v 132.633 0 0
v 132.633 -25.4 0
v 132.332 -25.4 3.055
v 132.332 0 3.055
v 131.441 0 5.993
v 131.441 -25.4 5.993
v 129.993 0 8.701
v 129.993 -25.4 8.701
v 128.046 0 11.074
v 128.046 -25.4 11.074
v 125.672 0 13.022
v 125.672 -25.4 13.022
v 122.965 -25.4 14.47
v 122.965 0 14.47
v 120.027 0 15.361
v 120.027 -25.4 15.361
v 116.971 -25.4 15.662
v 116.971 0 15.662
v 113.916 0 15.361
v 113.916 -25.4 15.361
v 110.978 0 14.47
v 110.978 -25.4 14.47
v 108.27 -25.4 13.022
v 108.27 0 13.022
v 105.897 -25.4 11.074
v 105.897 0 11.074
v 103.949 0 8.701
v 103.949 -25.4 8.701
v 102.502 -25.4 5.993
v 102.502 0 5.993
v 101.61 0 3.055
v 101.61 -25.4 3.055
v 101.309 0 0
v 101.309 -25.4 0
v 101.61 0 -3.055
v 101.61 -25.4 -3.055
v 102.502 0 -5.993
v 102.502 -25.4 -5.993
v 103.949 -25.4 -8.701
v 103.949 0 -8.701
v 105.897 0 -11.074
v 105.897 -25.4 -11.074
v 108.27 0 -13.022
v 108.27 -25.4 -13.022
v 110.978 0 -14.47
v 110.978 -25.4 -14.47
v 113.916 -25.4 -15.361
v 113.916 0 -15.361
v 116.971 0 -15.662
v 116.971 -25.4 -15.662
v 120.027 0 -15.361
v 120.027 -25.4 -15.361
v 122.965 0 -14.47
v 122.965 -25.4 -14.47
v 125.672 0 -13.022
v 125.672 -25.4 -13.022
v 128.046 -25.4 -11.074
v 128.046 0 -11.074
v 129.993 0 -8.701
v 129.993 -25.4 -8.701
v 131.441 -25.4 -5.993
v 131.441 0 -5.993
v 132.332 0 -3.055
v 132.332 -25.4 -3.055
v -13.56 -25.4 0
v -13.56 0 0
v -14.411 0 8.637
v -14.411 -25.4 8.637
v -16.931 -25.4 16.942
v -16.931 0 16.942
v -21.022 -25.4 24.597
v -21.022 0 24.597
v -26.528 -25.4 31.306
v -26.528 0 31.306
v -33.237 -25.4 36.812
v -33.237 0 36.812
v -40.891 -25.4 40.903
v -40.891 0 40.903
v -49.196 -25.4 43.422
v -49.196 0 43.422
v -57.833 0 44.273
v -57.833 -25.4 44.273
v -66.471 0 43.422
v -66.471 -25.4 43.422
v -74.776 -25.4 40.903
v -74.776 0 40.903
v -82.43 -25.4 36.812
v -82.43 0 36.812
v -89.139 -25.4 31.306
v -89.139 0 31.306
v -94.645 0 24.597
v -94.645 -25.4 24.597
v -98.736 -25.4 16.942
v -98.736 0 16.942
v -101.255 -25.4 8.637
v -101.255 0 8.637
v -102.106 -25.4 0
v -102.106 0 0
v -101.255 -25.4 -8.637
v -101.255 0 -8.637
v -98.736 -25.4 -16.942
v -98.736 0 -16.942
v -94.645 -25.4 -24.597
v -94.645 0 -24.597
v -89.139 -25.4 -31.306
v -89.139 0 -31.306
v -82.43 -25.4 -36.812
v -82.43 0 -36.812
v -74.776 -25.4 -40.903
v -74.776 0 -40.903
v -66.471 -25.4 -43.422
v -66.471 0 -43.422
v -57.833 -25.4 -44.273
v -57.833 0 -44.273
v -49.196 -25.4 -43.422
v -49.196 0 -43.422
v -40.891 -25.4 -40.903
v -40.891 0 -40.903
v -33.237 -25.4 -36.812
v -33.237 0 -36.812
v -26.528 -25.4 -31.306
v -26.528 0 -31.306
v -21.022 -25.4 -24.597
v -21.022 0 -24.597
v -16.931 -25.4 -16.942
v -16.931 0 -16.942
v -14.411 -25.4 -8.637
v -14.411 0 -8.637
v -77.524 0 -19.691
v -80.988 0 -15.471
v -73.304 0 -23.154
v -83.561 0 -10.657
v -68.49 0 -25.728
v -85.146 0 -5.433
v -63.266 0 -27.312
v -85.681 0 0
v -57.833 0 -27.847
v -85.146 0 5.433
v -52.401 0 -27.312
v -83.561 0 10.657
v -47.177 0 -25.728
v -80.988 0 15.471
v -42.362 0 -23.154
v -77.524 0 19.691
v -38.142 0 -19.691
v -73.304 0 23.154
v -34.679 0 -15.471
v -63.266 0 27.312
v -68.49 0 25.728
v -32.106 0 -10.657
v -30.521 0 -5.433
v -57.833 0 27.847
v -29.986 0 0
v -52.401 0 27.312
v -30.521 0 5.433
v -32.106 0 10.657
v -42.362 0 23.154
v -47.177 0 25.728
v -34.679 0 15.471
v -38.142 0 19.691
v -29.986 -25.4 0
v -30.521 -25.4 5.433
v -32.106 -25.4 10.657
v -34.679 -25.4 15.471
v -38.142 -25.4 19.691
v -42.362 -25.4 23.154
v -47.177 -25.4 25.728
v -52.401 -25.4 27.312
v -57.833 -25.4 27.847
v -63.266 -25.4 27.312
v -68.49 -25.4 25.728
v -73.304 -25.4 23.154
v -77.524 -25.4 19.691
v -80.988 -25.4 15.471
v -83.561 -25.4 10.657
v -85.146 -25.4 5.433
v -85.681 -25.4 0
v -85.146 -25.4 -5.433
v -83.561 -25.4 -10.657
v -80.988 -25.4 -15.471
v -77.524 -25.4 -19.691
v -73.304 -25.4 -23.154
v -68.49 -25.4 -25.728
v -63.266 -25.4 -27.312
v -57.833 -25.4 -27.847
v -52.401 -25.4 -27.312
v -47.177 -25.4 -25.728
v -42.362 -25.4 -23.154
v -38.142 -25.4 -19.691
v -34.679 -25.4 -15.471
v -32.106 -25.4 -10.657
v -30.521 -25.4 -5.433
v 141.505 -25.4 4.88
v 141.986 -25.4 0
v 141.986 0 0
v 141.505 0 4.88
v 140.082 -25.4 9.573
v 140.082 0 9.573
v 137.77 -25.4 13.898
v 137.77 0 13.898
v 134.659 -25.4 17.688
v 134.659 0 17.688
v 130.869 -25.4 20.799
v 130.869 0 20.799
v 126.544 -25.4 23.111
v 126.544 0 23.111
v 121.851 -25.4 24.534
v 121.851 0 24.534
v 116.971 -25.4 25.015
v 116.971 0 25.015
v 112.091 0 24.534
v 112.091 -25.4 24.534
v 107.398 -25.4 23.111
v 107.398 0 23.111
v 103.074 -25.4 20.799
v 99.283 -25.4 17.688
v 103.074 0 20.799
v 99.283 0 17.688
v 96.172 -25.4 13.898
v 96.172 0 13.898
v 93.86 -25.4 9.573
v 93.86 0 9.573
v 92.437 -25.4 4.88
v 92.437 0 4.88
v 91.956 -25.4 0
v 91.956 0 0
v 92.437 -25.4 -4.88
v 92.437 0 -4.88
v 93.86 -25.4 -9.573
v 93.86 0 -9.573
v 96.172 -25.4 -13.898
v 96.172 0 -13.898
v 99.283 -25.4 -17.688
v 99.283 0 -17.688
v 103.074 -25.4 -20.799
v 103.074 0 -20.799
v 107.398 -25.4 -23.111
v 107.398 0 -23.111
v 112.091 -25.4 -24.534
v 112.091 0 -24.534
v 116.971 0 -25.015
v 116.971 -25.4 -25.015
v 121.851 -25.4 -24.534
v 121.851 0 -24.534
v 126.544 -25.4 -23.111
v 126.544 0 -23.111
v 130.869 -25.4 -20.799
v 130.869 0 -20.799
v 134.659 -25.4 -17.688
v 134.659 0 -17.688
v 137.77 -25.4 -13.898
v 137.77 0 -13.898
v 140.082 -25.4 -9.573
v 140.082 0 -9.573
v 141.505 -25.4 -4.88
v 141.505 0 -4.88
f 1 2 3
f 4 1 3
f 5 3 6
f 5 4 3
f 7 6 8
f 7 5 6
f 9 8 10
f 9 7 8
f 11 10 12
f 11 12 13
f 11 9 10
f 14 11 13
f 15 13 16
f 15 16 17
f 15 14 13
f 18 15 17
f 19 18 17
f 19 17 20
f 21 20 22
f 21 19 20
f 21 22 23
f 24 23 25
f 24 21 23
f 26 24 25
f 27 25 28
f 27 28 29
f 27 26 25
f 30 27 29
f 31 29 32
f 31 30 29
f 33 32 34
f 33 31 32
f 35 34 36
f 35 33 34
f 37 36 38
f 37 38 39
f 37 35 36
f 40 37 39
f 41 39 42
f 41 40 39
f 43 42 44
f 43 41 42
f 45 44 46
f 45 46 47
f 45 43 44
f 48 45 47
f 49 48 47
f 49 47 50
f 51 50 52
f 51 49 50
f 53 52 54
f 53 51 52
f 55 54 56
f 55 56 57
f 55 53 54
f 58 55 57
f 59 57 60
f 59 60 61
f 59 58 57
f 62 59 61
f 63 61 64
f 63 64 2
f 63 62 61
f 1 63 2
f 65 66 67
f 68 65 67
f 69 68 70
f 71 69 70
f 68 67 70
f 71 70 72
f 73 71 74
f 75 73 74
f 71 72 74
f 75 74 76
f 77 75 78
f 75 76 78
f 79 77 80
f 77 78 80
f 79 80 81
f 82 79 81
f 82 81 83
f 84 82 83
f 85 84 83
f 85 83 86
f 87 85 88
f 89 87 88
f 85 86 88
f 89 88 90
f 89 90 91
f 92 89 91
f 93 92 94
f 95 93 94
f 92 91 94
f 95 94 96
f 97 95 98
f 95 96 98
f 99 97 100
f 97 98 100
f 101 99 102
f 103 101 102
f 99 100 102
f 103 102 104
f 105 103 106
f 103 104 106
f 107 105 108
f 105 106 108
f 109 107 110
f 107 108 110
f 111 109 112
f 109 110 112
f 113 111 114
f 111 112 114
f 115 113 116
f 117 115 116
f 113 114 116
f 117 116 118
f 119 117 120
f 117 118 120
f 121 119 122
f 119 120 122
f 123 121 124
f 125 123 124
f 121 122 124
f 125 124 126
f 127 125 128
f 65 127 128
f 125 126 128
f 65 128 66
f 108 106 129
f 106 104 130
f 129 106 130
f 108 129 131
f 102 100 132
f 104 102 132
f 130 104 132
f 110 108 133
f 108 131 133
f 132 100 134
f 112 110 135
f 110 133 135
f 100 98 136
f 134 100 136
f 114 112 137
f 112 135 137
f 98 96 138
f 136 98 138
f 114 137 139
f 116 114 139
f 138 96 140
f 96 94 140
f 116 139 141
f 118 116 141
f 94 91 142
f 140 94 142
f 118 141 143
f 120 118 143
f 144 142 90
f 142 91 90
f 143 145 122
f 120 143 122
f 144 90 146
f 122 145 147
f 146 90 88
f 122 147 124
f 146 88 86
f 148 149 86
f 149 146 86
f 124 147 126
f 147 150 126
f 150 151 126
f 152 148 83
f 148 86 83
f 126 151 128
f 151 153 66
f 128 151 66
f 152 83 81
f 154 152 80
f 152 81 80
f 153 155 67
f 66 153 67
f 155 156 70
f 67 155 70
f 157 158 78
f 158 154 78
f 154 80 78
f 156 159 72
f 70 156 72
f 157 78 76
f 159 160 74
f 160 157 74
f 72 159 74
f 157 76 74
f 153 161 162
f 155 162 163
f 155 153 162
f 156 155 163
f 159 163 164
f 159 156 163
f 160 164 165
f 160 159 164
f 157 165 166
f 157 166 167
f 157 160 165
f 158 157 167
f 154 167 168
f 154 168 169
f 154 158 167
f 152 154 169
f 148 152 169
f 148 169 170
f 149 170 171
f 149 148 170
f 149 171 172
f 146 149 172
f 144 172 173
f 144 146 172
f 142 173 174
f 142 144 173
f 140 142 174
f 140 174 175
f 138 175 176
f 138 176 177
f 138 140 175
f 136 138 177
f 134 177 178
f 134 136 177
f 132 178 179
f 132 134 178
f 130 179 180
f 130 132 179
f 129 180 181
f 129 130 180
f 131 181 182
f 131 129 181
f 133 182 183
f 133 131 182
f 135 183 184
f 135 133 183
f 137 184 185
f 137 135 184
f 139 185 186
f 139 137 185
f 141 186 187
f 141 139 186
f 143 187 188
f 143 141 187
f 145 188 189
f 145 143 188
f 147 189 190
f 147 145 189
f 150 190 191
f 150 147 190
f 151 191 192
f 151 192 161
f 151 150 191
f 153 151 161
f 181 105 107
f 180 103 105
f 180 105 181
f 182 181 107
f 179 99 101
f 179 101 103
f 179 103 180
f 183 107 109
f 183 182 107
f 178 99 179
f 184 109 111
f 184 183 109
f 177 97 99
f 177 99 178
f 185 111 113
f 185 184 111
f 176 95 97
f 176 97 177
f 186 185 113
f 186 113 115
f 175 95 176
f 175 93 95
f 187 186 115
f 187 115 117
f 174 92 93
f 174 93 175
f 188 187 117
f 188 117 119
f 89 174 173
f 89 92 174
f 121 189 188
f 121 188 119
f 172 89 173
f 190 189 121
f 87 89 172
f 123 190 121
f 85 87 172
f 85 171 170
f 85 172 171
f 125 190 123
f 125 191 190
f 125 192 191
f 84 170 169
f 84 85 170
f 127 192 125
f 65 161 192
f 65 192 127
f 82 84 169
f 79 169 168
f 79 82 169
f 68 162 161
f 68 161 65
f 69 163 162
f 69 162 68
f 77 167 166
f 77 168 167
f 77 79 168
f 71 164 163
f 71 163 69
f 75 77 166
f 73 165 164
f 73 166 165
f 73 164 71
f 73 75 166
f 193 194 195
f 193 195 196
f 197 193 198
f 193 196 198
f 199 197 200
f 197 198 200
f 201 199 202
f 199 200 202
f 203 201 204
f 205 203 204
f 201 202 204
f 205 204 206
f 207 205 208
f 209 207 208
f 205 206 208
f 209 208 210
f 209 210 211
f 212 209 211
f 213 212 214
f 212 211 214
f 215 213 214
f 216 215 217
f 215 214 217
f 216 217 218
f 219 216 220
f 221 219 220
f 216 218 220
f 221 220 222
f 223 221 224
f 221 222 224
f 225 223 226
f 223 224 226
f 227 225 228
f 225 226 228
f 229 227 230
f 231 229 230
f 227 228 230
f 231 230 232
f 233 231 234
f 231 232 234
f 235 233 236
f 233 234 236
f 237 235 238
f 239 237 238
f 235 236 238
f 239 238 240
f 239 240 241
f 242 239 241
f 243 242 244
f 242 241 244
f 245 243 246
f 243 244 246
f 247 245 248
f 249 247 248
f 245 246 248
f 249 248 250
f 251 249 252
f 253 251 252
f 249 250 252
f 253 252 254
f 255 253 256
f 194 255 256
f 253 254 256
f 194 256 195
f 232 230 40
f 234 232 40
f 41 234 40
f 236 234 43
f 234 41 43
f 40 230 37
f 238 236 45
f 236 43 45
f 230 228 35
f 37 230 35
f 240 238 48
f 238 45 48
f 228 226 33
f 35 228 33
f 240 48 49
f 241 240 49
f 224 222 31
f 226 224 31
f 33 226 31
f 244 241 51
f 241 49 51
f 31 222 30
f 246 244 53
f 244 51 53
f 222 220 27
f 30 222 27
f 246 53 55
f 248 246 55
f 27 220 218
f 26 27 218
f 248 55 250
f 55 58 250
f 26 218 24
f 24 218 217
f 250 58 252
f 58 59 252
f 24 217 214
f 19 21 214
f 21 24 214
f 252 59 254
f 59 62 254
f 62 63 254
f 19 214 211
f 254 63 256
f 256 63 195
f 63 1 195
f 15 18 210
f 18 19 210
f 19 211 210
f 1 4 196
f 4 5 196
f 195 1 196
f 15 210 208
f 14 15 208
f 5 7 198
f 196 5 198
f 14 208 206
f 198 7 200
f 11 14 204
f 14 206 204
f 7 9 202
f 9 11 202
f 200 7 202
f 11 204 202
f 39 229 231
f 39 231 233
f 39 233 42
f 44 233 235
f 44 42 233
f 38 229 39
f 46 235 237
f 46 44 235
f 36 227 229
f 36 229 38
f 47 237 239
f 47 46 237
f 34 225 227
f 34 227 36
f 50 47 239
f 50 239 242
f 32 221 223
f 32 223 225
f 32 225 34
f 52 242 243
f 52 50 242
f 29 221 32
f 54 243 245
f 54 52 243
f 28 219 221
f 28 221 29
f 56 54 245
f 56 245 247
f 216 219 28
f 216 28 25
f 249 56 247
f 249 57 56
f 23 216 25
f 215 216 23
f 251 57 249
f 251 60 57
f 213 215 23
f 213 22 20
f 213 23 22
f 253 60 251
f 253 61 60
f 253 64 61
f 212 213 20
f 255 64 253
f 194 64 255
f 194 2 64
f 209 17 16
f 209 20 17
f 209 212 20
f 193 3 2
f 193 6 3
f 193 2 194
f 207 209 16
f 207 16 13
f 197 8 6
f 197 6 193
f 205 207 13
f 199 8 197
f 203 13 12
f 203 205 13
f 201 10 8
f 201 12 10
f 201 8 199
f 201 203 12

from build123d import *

# Parameters (mm, degrees)
F0_R     = 44.2728282083
F0_R_2   = 27.8473949091
F1_DEPTH = 25.4
F2_R     = 25.0148515276
F2_R_2   = 15.6616777409
F3_DEPTH = 25.4


# Not quite as in the source:
# - the program builds the solid bodies; features that only make, move or delete a surface that nothing else refers to are left out


with BuildPart() as f1:
    # F0 (on Front) → F1 (new body)
    with BuildSketch(Plane.XZ):
        with Locations((-57.833313942, 0)):
            Circle(F0_R)
        with Locations((-57.833313942, 0)):
            Circle(F0_R_2, mode=Mode.SUBTRACT)
    extrude(amount=F1_DEPTH)


with BuildPart() as f3:
    # F2 (on Front) → F3 (new body)
    with BuildSketch(Plane.XZ):
        with Locations((116.9711351395, 0)):
            Circle(F2_R)
        with Locations((116.9711351395, 0)):
            Circle(F2_R_2, mode=Mode.SUBTRACT)
    extrude(amount=F3_DEPTH)


solid = Compound([f1.part, f3.part])
